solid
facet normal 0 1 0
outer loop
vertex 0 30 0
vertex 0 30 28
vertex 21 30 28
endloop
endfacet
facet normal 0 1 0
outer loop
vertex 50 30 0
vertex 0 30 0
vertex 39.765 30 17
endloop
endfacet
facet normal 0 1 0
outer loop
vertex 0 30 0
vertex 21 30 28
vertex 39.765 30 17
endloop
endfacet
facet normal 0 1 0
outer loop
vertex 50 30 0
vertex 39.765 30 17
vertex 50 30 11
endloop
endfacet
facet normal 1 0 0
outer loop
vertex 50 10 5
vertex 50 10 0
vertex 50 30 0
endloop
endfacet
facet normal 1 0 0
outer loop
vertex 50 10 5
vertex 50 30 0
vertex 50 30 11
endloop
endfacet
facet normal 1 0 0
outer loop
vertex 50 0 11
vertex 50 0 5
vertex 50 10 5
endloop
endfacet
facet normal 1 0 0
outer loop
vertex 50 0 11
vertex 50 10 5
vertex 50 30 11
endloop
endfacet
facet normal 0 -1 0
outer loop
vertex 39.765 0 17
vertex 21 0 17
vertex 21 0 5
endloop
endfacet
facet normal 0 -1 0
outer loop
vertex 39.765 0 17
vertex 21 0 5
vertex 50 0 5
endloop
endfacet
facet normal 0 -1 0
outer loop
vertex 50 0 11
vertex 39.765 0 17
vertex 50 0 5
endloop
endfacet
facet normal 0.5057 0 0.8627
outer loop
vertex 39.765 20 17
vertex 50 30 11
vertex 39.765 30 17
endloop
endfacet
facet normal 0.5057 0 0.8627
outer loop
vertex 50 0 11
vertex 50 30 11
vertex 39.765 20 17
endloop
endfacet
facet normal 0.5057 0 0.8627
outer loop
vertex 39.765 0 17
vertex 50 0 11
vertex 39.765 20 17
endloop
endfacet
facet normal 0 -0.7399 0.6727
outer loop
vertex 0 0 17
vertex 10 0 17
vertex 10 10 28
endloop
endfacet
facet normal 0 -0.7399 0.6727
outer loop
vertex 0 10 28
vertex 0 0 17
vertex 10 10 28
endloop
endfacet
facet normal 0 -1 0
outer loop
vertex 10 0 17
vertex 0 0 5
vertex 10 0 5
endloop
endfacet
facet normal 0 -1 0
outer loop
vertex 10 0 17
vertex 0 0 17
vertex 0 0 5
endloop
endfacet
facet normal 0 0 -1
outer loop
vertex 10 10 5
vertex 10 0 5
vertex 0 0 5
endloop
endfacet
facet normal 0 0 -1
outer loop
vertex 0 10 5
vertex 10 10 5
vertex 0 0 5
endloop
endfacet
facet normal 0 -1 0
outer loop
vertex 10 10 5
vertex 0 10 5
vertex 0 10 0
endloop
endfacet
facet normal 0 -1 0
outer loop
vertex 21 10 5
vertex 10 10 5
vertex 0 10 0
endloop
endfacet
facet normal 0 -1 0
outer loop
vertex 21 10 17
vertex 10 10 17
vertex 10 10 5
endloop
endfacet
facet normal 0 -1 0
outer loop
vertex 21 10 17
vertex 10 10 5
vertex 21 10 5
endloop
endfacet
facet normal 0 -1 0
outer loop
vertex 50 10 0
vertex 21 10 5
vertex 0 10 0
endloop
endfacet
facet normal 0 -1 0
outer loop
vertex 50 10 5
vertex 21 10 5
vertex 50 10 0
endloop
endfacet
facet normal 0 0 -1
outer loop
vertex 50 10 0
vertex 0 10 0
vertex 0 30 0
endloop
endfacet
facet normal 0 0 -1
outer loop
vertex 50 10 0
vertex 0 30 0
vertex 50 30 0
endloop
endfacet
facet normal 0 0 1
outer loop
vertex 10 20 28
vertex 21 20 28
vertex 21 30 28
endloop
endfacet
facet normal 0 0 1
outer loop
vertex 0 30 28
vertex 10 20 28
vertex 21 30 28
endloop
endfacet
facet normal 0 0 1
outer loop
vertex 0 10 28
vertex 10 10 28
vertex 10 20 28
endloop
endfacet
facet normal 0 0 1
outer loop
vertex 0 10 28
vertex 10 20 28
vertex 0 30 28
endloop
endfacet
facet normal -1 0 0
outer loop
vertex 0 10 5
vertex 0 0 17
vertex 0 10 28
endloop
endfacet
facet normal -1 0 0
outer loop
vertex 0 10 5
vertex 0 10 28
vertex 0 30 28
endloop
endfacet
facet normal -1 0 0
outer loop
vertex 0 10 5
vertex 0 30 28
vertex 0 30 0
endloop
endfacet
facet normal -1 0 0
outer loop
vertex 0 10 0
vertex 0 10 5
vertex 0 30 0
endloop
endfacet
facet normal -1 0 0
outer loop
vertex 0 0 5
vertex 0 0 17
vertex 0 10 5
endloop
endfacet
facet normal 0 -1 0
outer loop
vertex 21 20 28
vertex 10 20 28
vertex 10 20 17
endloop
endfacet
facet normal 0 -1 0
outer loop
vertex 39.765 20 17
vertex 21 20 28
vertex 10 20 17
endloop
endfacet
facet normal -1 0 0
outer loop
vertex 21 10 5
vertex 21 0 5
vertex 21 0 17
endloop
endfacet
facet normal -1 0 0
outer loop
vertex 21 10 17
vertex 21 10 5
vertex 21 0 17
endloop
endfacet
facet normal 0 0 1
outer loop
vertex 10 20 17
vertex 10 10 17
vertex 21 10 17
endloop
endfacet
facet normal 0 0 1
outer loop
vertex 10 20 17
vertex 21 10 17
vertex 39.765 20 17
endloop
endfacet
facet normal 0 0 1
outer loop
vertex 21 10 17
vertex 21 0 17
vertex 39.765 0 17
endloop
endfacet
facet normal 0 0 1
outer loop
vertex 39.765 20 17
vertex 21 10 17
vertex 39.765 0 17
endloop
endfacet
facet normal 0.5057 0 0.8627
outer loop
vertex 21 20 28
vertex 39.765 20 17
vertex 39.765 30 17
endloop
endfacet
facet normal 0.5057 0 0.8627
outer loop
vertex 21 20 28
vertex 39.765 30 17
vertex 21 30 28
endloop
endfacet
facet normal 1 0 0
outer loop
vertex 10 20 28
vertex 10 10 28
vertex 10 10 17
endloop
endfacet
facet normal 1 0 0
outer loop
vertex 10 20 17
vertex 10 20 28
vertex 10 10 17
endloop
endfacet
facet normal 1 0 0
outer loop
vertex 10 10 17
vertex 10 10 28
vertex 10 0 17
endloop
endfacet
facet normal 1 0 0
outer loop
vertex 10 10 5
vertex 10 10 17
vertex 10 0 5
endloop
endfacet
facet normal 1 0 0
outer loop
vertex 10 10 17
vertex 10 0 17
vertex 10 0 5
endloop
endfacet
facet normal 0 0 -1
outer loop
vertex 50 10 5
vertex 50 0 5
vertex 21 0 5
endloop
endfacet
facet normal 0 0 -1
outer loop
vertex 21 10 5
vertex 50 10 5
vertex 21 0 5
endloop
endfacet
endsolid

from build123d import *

# Parameters (mm, degrees)
F1_DEPTH = 30
F2_DEPTH = 10
F3_DEPTH = 20
F5_DEPTH = 10.001


with BuildPart() as f1:
    # F0 (on Front) → F1 (new body)
    with BuildSketch(Plane.XZ):
        Polygon((0, 28), (0, 5), (10, 5), (10, 17), (10, 28), align=None)
        Polygon((0, 5), (0, 0), (50, 0), (50, 5), (21, 5), (21, 17), (10, 17), (10, 5), align=None)
        Polygon((21, 5), (50, 5), (50, 11), (39.764706, 17), (21, 17), align=None)
        Polygon((21, 28), (10, 28), (10, 17), (21, 17), (39.764706, 17), align=None)
    extrude(amount=-F1_DEPTH)

    # F0 (on Front) → F2 (cut)
    with BuildSketch(Plane.XZ):
        Polygon((0, 5), (0, 0), (50, 0), (50, 5), (21, 5), (21, 17), (10, 17), (10, 5), align=None)
    extrude(amount=-F2_DEPTH, mode=Mode.SUBTRACT)

    # F0 (on Front) → F3 (cut)
    with BuildSketch(Plane.XZ):
        Polygon((21, 28), (10, 28), (10, 17), (21, 17), (39.764706, 17), align=None)
    extrude(amount=-F3_DEPTH, mode=Mode.SUBTRACT)

    # F4 (on face) → F5 (cut, through all)
    with BuildSketch(Plane.YZ.offset(10)):
        Polygon((0, 17), (10, 28), (0, 28), align=None)
    extrude(amount=-F5_DEPTH, mode=Mode.SUBTRACT)


solid = f1.part
